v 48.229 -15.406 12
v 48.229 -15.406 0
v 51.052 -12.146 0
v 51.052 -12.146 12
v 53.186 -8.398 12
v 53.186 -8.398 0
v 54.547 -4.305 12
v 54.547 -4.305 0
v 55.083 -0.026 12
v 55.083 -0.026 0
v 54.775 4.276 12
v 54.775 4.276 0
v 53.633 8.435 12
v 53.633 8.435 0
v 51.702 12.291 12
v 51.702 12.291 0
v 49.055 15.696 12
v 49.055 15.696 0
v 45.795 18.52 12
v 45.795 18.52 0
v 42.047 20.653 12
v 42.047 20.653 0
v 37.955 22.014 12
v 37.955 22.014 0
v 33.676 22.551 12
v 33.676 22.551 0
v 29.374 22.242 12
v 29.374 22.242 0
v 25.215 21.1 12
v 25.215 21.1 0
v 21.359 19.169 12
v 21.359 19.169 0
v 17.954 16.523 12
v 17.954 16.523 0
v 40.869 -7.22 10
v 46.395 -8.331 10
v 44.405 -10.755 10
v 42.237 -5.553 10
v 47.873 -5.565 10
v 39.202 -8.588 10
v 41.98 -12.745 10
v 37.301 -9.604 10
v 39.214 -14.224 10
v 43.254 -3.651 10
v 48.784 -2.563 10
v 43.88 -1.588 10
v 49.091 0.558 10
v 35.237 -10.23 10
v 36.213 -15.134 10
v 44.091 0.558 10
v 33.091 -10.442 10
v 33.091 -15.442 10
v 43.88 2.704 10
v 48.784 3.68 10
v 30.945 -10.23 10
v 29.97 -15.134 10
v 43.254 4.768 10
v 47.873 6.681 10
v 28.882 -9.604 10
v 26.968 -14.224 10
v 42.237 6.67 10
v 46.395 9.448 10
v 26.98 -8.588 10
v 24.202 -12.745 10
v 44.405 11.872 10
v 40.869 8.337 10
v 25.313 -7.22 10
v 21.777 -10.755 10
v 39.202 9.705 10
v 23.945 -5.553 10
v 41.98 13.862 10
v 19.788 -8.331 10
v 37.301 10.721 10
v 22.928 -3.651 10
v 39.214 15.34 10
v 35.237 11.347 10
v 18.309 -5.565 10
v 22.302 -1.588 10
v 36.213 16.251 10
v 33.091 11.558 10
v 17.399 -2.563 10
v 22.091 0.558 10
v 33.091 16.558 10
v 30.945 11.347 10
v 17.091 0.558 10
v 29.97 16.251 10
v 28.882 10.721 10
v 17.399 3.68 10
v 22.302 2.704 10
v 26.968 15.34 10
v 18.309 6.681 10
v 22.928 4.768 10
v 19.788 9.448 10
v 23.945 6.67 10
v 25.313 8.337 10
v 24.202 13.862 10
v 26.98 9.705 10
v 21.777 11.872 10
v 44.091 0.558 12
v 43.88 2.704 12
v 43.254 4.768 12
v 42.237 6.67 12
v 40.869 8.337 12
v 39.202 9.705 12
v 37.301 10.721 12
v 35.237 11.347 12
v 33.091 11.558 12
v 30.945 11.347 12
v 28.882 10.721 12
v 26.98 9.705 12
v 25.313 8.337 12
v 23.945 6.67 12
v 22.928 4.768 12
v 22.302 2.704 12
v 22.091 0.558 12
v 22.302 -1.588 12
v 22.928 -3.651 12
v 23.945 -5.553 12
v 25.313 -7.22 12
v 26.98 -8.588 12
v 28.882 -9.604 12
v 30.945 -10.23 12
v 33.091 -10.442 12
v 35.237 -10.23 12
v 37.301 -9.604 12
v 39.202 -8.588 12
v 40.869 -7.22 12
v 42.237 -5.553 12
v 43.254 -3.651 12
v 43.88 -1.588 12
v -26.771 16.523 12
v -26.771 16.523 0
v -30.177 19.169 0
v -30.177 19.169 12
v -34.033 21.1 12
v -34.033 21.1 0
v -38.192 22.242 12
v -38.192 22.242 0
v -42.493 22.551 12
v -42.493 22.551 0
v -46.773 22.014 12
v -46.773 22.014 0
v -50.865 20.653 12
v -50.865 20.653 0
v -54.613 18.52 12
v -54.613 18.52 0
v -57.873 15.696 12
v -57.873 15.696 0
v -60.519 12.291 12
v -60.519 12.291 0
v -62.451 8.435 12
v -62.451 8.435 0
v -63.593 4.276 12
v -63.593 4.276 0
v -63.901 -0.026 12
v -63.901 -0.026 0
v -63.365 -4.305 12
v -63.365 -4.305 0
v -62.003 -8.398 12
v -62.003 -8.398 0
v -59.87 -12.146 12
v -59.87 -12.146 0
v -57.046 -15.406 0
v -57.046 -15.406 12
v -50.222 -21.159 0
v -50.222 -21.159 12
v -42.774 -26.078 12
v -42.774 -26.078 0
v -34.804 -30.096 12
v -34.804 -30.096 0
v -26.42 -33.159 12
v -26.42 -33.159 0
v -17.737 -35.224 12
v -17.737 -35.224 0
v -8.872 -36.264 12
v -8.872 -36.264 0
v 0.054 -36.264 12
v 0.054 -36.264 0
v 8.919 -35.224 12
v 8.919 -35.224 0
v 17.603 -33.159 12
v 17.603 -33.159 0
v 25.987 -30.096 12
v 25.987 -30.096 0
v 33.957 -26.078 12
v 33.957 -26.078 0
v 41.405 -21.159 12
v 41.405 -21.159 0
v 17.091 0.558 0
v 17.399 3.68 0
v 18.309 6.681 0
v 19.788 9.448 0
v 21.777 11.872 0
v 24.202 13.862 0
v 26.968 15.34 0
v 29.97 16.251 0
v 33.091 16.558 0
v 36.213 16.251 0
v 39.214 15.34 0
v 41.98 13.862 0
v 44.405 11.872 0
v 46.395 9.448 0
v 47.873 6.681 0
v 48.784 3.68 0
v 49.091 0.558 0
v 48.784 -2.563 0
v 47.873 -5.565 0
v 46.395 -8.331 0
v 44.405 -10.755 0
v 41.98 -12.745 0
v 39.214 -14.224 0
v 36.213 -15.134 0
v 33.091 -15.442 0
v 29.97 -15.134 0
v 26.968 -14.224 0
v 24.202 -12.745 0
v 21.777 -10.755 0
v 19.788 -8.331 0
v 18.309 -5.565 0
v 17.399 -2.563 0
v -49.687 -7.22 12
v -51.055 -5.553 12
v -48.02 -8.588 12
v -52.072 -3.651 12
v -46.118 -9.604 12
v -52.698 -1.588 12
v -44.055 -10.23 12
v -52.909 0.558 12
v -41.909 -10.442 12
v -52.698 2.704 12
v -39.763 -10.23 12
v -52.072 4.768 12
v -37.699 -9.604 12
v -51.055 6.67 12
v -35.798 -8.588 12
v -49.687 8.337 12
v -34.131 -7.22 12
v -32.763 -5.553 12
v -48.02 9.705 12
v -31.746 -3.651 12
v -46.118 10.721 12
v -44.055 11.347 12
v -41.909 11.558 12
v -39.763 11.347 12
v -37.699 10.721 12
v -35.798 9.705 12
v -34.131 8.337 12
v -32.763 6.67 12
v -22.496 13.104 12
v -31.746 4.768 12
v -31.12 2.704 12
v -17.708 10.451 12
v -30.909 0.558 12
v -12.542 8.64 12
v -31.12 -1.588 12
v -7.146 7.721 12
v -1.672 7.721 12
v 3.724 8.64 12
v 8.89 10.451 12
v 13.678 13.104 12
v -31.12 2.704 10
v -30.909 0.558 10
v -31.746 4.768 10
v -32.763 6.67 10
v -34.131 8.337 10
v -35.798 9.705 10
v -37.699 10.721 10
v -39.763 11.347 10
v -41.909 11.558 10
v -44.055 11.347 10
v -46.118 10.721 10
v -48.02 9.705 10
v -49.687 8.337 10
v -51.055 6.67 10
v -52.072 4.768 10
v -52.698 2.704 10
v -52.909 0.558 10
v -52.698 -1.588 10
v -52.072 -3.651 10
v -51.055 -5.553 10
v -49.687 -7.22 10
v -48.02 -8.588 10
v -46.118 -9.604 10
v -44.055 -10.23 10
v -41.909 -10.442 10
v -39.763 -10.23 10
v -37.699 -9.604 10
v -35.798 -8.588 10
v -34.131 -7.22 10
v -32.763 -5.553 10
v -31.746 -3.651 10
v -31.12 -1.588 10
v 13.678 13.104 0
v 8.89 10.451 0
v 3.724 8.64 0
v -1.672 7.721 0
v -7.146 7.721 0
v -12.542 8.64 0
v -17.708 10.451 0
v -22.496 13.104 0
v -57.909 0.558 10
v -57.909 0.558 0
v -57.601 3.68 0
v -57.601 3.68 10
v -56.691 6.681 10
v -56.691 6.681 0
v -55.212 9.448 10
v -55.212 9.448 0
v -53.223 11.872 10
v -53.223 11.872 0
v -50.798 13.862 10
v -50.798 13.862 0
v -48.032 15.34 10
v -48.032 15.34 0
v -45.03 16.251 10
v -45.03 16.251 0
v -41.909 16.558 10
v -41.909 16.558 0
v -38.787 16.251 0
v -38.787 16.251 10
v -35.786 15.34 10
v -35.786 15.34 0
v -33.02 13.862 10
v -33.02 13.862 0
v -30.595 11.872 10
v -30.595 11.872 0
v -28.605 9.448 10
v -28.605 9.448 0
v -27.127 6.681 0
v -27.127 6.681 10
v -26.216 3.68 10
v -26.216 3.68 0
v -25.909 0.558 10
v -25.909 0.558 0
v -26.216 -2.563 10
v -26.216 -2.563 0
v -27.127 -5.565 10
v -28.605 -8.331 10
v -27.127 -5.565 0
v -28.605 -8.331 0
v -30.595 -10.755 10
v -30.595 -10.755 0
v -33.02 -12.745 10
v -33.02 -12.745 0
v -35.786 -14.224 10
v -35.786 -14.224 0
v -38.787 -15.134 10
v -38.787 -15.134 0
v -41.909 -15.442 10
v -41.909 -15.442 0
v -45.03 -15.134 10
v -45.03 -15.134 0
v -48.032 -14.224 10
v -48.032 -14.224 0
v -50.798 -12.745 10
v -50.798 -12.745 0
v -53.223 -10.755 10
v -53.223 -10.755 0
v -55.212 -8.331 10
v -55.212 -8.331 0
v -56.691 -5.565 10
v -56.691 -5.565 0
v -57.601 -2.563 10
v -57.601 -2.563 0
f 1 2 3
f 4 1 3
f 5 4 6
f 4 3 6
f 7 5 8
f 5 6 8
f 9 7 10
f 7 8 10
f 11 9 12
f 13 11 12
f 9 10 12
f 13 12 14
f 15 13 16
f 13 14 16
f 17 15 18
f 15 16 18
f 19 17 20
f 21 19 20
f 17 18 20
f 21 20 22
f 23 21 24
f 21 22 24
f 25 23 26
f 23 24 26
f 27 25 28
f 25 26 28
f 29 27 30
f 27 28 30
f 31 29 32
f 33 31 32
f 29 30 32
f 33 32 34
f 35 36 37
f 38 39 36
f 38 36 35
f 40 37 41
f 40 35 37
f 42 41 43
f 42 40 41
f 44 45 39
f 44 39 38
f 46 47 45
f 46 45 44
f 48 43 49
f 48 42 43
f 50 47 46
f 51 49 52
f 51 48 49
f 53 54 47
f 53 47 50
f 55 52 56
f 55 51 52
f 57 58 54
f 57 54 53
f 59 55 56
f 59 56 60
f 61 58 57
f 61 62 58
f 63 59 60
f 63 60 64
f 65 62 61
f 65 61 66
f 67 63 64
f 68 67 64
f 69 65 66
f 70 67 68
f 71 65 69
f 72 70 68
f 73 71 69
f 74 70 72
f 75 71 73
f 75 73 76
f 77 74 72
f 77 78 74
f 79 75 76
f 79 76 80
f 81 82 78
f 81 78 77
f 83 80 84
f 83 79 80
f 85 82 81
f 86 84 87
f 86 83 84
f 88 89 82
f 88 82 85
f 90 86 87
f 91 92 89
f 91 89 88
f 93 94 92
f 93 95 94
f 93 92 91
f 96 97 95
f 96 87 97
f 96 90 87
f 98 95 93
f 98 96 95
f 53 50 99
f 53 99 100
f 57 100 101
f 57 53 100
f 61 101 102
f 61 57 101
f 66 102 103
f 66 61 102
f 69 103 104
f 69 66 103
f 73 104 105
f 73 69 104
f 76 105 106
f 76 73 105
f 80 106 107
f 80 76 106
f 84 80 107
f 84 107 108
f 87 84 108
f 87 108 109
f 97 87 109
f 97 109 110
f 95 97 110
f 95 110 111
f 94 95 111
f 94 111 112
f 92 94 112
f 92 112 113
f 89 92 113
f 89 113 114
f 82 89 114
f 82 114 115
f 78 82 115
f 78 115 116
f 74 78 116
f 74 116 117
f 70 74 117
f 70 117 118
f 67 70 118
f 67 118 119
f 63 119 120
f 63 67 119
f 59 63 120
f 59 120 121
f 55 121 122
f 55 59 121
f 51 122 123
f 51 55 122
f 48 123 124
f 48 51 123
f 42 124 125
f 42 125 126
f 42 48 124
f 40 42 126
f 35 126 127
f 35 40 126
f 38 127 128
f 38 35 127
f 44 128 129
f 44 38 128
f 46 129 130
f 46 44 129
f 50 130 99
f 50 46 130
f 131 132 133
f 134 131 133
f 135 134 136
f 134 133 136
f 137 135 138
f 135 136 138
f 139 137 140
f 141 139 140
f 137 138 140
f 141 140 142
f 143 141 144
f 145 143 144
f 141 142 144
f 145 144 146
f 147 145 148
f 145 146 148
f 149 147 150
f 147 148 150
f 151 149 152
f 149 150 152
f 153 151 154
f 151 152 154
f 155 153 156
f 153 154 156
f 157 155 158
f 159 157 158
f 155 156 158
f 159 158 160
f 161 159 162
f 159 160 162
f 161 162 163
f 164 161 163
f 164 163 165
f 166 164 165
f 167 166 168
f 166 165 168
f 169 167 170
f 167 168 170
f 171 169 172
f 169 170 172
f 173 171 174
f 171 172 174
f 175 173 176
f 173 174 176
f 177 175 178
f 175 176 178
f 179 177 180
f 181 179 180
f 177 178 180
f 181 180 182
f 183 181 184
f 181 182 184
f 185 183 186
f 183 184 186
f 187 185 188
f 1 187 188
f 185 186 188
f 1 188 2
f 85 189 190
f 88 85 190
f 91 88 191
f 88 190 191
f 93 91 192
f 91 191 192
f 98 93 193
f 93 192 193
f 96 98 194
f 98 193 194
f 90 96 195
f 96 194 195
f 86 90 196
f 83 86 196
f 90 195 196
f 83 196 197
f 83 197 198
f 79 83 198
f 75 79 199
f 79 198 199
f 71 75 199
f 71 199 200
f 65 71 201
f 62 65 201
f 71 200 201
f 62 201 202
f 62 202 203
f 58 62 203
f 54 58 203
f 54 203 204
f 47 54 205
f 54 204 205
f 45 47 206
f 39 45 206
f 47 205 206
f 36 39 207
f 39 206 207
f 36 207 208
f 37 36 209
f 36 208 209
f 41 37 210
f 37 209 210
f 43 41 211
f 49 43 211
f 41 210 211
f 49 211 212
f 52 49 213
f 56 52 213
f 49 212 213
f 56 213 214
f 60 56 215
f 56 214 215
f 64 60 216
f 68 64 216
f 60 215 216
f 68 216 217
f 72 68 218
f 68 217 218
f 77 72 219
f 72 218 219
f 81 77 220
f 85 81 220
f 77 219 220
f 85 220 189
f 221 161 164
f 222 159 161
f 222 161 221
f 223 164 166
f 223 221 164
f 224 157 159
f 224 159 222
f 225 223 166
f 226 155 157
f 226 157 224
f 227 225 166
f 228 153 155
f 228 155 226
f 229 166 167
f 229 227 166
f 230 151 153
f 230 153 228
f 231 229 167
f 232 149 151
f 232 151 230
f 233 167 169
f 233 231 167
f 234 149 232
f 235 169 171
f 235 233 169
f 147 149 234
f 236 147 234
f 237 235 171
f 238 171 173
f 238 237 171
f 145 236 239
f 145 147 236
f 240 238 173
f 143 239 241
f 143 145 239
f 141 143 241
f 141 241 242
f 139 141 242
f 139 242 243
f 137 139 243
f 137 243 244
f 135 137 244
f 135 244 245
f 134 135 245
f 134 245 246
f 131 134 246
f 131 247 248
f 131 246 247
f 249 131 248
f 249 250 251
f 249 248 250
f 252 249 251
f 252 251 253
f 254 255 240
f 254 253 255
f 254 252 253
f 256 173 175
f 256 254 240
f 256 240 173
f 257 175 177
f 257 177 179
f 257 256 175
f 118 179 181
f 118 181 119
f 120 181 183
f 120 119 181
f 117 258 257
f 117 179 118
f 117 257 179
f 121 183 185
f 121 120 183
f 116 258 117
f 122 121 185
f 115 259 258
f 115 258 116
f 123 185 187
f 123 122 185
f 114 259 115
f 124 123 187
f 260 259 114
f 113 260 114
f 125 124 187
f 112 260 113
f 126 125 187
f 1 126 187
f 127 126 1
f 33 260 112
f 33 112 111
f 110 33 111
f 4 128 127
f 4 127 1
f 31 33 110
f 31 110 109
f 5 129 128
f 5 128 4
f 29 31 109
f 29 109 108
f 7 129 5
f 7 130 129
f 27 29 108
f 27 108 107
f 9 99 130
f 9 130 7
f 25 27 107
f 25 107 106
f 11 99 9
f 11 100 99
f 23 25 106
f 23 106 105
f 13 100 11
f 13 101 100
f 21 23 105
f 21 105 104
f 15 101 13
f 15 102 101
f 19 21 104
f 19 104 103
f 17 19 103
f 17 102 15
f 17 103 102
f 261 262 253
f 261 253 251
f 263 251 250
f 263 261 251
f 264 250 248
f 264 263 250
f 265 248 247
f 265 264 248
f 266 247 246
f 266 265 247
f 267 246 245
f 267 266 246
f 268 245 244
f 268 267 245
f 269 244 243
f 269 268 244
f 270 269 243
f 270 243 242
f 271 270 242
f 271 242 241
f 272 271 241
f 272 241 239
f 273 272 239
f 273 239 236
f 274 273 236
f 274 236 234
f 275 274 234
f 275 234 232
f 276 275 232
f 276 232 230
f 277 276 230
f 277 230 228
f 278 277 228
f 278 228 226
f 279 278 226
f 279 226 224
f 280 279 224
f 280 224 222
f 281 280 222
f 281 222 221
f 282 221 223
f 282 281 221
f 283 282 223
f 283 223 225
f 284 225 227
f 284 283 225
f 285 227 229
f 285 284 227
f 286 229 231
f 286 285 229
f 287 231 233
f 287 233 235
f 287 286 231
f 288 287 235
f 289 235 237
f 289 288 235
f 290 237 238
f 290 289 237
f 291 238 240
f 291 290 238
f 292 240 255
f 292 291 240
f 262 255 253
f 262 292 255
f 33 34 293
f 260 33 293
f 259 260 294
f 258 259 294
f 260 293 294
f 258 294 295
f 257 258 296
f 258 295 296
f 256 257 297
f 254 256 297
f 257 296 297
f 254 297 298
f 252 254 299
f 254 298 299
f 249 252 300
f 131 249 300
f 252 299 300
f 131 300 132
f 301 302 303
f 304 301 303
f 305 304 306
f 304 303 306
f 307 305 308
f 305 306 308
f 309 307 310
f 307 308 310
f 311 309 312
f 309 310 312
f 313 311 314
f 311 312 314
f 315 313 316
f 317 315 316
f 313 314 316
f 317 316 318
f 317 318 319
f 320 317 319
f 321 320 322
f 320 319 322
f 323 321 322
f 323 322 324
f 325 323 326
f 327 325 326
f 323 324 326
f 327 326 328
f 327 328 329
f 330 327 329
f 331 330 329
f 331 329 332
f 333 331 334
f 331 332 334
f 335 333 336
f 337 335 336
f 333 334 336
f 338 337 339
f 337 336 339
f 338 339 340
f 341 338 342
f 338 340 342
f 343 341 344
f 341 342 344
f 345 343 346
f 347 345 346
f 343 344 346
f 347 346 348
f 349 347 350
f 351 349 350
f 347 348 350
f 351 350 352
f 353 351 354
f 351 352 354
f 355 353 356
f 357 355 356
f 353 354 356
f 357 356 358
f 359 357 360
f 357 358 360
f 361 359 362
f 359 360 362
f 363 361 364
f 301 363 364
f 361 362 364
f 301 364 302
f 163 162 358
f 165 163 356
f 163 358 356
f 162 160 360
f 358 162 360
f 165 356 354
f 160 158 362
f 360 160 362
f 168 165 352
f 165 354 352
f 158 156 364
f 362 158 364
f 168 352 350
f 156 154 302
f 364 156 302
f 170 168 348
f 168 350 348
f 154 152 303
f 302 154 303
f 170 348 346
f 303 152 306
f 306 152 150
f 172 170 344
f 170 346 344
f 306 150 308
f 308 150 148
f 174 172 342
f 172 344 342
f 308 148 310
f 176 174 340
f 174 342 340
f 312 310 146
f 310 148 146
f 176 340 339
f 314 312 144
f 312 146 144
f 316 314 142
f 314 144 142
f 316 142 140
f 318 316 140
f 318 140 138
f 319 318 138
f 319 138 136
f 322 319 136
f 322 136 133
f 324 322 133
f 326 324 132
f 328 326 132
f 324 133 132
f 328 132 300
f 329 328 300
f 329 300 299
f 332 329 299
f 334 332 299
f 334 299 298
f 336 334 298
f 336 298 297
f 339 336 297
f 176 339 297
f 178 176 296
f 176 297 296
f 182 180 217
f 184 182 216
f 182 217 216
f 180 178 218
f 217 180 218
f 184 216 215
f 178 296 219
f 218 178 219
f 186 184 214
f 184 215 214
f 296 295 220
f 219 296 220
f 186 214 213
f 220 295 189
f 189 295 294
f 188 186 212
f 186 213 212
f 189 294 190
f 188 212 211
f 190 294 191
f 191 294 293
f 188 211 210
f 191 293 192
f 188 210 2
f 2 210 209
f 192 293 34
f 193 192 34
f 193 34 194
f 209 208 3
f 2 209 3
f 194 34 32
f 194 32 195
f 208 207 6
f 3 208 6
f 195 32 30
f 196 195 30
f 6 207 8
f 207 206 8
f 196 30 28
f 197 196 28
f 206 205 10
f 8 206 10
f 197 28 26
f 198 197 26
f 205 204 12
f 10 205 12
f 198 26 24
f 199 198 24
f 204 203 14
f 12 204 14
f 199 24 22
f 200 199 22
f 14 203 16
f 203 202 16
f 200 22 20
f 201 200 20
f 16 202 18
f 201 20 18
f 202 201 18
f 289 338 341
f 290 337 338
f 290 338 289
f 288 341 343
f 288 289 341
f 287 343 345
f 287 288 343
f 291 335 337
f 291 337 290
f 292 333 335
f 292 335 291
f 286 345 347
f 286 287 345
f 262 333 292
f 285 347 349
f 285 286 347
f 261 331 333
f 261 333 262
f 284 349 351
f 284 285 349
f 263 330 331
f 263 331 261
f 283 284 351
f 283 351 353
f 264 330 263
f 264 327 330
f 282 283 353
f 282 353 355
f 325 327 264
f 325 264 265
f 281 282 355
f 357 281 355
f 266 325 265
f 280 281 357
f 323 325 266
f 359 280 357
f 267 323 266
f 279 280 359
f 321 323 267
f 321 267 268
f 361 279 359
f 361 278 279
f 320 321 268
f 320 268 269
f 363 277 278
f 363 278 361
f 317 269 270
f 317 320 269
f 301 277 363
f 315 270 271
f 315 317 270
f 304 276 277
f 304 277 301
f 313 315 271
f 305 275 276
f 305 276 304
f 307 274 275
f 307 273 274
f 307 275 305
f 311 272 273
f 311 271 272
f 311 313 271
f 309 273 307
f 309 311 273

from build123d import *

# Parameters (mm, degrees)
CROQUIS1_R              = 11
SALIENTE_EXTRUIR1_DEPTH = 12
CROQUIS3_R              = 16
CORTAR_EXTRUIR2_DEPTH   = 10


with BuildPart() as part:
    # Croquis1 → Saliente-Extruir1 (new body)
    with BuildSketch(Plane.XY):
        with BuildLine():
            ThreePointArc((-26.771248385, 16.522500226), (-57.87296723, 15.696010738), (-57.046477743, -15.405708107))
            ThreePointArc((-57.046477743, -15.405708107), (-4.408863064, -36.394164074), (48.228751615, -15.405708107))
            ThreePointArc((48.228751615, -15.405708107), (49.055241102, 15.696010738), (17.953522257, 16.522500226))
            ThreePointArc((17.953522257, 16.522500226), (-4.408863064, 7.605835926), (-26.771248385, 16.522500226))
        make_face()
        with Locations((-41.908863064, 0.558396059)):
            Circle(CROQUIS1_R, mode=Mode.SUBTRACT)
        with Locations((33.091136936, 0.558396059)):
            Circle(CROQUIS1_R, mode=Mode.SUBTRACT)
    extrude(amount=SALIENTE_EXTRUIR1_DEPTH)

    # Croquis3 → Cortar-Extruir2 (cut)
    with BuildSketch(Plane(origin=(0, 0, 0), x_dir=(-1, 0, 0), z_dir=(0, 0, -1))):
        with Locations((41.908863064, 0.558396059)):
            Circle(CROQUIS3_R)
        with Locations((-33.091136936, 0.558396059)):
            Circle(CROQUIS3_R)
    extrude(amount=-CORTAR_EXTRUIR2_DEPTH, mode=Mode.SUBTRACT)


solid = part.part
